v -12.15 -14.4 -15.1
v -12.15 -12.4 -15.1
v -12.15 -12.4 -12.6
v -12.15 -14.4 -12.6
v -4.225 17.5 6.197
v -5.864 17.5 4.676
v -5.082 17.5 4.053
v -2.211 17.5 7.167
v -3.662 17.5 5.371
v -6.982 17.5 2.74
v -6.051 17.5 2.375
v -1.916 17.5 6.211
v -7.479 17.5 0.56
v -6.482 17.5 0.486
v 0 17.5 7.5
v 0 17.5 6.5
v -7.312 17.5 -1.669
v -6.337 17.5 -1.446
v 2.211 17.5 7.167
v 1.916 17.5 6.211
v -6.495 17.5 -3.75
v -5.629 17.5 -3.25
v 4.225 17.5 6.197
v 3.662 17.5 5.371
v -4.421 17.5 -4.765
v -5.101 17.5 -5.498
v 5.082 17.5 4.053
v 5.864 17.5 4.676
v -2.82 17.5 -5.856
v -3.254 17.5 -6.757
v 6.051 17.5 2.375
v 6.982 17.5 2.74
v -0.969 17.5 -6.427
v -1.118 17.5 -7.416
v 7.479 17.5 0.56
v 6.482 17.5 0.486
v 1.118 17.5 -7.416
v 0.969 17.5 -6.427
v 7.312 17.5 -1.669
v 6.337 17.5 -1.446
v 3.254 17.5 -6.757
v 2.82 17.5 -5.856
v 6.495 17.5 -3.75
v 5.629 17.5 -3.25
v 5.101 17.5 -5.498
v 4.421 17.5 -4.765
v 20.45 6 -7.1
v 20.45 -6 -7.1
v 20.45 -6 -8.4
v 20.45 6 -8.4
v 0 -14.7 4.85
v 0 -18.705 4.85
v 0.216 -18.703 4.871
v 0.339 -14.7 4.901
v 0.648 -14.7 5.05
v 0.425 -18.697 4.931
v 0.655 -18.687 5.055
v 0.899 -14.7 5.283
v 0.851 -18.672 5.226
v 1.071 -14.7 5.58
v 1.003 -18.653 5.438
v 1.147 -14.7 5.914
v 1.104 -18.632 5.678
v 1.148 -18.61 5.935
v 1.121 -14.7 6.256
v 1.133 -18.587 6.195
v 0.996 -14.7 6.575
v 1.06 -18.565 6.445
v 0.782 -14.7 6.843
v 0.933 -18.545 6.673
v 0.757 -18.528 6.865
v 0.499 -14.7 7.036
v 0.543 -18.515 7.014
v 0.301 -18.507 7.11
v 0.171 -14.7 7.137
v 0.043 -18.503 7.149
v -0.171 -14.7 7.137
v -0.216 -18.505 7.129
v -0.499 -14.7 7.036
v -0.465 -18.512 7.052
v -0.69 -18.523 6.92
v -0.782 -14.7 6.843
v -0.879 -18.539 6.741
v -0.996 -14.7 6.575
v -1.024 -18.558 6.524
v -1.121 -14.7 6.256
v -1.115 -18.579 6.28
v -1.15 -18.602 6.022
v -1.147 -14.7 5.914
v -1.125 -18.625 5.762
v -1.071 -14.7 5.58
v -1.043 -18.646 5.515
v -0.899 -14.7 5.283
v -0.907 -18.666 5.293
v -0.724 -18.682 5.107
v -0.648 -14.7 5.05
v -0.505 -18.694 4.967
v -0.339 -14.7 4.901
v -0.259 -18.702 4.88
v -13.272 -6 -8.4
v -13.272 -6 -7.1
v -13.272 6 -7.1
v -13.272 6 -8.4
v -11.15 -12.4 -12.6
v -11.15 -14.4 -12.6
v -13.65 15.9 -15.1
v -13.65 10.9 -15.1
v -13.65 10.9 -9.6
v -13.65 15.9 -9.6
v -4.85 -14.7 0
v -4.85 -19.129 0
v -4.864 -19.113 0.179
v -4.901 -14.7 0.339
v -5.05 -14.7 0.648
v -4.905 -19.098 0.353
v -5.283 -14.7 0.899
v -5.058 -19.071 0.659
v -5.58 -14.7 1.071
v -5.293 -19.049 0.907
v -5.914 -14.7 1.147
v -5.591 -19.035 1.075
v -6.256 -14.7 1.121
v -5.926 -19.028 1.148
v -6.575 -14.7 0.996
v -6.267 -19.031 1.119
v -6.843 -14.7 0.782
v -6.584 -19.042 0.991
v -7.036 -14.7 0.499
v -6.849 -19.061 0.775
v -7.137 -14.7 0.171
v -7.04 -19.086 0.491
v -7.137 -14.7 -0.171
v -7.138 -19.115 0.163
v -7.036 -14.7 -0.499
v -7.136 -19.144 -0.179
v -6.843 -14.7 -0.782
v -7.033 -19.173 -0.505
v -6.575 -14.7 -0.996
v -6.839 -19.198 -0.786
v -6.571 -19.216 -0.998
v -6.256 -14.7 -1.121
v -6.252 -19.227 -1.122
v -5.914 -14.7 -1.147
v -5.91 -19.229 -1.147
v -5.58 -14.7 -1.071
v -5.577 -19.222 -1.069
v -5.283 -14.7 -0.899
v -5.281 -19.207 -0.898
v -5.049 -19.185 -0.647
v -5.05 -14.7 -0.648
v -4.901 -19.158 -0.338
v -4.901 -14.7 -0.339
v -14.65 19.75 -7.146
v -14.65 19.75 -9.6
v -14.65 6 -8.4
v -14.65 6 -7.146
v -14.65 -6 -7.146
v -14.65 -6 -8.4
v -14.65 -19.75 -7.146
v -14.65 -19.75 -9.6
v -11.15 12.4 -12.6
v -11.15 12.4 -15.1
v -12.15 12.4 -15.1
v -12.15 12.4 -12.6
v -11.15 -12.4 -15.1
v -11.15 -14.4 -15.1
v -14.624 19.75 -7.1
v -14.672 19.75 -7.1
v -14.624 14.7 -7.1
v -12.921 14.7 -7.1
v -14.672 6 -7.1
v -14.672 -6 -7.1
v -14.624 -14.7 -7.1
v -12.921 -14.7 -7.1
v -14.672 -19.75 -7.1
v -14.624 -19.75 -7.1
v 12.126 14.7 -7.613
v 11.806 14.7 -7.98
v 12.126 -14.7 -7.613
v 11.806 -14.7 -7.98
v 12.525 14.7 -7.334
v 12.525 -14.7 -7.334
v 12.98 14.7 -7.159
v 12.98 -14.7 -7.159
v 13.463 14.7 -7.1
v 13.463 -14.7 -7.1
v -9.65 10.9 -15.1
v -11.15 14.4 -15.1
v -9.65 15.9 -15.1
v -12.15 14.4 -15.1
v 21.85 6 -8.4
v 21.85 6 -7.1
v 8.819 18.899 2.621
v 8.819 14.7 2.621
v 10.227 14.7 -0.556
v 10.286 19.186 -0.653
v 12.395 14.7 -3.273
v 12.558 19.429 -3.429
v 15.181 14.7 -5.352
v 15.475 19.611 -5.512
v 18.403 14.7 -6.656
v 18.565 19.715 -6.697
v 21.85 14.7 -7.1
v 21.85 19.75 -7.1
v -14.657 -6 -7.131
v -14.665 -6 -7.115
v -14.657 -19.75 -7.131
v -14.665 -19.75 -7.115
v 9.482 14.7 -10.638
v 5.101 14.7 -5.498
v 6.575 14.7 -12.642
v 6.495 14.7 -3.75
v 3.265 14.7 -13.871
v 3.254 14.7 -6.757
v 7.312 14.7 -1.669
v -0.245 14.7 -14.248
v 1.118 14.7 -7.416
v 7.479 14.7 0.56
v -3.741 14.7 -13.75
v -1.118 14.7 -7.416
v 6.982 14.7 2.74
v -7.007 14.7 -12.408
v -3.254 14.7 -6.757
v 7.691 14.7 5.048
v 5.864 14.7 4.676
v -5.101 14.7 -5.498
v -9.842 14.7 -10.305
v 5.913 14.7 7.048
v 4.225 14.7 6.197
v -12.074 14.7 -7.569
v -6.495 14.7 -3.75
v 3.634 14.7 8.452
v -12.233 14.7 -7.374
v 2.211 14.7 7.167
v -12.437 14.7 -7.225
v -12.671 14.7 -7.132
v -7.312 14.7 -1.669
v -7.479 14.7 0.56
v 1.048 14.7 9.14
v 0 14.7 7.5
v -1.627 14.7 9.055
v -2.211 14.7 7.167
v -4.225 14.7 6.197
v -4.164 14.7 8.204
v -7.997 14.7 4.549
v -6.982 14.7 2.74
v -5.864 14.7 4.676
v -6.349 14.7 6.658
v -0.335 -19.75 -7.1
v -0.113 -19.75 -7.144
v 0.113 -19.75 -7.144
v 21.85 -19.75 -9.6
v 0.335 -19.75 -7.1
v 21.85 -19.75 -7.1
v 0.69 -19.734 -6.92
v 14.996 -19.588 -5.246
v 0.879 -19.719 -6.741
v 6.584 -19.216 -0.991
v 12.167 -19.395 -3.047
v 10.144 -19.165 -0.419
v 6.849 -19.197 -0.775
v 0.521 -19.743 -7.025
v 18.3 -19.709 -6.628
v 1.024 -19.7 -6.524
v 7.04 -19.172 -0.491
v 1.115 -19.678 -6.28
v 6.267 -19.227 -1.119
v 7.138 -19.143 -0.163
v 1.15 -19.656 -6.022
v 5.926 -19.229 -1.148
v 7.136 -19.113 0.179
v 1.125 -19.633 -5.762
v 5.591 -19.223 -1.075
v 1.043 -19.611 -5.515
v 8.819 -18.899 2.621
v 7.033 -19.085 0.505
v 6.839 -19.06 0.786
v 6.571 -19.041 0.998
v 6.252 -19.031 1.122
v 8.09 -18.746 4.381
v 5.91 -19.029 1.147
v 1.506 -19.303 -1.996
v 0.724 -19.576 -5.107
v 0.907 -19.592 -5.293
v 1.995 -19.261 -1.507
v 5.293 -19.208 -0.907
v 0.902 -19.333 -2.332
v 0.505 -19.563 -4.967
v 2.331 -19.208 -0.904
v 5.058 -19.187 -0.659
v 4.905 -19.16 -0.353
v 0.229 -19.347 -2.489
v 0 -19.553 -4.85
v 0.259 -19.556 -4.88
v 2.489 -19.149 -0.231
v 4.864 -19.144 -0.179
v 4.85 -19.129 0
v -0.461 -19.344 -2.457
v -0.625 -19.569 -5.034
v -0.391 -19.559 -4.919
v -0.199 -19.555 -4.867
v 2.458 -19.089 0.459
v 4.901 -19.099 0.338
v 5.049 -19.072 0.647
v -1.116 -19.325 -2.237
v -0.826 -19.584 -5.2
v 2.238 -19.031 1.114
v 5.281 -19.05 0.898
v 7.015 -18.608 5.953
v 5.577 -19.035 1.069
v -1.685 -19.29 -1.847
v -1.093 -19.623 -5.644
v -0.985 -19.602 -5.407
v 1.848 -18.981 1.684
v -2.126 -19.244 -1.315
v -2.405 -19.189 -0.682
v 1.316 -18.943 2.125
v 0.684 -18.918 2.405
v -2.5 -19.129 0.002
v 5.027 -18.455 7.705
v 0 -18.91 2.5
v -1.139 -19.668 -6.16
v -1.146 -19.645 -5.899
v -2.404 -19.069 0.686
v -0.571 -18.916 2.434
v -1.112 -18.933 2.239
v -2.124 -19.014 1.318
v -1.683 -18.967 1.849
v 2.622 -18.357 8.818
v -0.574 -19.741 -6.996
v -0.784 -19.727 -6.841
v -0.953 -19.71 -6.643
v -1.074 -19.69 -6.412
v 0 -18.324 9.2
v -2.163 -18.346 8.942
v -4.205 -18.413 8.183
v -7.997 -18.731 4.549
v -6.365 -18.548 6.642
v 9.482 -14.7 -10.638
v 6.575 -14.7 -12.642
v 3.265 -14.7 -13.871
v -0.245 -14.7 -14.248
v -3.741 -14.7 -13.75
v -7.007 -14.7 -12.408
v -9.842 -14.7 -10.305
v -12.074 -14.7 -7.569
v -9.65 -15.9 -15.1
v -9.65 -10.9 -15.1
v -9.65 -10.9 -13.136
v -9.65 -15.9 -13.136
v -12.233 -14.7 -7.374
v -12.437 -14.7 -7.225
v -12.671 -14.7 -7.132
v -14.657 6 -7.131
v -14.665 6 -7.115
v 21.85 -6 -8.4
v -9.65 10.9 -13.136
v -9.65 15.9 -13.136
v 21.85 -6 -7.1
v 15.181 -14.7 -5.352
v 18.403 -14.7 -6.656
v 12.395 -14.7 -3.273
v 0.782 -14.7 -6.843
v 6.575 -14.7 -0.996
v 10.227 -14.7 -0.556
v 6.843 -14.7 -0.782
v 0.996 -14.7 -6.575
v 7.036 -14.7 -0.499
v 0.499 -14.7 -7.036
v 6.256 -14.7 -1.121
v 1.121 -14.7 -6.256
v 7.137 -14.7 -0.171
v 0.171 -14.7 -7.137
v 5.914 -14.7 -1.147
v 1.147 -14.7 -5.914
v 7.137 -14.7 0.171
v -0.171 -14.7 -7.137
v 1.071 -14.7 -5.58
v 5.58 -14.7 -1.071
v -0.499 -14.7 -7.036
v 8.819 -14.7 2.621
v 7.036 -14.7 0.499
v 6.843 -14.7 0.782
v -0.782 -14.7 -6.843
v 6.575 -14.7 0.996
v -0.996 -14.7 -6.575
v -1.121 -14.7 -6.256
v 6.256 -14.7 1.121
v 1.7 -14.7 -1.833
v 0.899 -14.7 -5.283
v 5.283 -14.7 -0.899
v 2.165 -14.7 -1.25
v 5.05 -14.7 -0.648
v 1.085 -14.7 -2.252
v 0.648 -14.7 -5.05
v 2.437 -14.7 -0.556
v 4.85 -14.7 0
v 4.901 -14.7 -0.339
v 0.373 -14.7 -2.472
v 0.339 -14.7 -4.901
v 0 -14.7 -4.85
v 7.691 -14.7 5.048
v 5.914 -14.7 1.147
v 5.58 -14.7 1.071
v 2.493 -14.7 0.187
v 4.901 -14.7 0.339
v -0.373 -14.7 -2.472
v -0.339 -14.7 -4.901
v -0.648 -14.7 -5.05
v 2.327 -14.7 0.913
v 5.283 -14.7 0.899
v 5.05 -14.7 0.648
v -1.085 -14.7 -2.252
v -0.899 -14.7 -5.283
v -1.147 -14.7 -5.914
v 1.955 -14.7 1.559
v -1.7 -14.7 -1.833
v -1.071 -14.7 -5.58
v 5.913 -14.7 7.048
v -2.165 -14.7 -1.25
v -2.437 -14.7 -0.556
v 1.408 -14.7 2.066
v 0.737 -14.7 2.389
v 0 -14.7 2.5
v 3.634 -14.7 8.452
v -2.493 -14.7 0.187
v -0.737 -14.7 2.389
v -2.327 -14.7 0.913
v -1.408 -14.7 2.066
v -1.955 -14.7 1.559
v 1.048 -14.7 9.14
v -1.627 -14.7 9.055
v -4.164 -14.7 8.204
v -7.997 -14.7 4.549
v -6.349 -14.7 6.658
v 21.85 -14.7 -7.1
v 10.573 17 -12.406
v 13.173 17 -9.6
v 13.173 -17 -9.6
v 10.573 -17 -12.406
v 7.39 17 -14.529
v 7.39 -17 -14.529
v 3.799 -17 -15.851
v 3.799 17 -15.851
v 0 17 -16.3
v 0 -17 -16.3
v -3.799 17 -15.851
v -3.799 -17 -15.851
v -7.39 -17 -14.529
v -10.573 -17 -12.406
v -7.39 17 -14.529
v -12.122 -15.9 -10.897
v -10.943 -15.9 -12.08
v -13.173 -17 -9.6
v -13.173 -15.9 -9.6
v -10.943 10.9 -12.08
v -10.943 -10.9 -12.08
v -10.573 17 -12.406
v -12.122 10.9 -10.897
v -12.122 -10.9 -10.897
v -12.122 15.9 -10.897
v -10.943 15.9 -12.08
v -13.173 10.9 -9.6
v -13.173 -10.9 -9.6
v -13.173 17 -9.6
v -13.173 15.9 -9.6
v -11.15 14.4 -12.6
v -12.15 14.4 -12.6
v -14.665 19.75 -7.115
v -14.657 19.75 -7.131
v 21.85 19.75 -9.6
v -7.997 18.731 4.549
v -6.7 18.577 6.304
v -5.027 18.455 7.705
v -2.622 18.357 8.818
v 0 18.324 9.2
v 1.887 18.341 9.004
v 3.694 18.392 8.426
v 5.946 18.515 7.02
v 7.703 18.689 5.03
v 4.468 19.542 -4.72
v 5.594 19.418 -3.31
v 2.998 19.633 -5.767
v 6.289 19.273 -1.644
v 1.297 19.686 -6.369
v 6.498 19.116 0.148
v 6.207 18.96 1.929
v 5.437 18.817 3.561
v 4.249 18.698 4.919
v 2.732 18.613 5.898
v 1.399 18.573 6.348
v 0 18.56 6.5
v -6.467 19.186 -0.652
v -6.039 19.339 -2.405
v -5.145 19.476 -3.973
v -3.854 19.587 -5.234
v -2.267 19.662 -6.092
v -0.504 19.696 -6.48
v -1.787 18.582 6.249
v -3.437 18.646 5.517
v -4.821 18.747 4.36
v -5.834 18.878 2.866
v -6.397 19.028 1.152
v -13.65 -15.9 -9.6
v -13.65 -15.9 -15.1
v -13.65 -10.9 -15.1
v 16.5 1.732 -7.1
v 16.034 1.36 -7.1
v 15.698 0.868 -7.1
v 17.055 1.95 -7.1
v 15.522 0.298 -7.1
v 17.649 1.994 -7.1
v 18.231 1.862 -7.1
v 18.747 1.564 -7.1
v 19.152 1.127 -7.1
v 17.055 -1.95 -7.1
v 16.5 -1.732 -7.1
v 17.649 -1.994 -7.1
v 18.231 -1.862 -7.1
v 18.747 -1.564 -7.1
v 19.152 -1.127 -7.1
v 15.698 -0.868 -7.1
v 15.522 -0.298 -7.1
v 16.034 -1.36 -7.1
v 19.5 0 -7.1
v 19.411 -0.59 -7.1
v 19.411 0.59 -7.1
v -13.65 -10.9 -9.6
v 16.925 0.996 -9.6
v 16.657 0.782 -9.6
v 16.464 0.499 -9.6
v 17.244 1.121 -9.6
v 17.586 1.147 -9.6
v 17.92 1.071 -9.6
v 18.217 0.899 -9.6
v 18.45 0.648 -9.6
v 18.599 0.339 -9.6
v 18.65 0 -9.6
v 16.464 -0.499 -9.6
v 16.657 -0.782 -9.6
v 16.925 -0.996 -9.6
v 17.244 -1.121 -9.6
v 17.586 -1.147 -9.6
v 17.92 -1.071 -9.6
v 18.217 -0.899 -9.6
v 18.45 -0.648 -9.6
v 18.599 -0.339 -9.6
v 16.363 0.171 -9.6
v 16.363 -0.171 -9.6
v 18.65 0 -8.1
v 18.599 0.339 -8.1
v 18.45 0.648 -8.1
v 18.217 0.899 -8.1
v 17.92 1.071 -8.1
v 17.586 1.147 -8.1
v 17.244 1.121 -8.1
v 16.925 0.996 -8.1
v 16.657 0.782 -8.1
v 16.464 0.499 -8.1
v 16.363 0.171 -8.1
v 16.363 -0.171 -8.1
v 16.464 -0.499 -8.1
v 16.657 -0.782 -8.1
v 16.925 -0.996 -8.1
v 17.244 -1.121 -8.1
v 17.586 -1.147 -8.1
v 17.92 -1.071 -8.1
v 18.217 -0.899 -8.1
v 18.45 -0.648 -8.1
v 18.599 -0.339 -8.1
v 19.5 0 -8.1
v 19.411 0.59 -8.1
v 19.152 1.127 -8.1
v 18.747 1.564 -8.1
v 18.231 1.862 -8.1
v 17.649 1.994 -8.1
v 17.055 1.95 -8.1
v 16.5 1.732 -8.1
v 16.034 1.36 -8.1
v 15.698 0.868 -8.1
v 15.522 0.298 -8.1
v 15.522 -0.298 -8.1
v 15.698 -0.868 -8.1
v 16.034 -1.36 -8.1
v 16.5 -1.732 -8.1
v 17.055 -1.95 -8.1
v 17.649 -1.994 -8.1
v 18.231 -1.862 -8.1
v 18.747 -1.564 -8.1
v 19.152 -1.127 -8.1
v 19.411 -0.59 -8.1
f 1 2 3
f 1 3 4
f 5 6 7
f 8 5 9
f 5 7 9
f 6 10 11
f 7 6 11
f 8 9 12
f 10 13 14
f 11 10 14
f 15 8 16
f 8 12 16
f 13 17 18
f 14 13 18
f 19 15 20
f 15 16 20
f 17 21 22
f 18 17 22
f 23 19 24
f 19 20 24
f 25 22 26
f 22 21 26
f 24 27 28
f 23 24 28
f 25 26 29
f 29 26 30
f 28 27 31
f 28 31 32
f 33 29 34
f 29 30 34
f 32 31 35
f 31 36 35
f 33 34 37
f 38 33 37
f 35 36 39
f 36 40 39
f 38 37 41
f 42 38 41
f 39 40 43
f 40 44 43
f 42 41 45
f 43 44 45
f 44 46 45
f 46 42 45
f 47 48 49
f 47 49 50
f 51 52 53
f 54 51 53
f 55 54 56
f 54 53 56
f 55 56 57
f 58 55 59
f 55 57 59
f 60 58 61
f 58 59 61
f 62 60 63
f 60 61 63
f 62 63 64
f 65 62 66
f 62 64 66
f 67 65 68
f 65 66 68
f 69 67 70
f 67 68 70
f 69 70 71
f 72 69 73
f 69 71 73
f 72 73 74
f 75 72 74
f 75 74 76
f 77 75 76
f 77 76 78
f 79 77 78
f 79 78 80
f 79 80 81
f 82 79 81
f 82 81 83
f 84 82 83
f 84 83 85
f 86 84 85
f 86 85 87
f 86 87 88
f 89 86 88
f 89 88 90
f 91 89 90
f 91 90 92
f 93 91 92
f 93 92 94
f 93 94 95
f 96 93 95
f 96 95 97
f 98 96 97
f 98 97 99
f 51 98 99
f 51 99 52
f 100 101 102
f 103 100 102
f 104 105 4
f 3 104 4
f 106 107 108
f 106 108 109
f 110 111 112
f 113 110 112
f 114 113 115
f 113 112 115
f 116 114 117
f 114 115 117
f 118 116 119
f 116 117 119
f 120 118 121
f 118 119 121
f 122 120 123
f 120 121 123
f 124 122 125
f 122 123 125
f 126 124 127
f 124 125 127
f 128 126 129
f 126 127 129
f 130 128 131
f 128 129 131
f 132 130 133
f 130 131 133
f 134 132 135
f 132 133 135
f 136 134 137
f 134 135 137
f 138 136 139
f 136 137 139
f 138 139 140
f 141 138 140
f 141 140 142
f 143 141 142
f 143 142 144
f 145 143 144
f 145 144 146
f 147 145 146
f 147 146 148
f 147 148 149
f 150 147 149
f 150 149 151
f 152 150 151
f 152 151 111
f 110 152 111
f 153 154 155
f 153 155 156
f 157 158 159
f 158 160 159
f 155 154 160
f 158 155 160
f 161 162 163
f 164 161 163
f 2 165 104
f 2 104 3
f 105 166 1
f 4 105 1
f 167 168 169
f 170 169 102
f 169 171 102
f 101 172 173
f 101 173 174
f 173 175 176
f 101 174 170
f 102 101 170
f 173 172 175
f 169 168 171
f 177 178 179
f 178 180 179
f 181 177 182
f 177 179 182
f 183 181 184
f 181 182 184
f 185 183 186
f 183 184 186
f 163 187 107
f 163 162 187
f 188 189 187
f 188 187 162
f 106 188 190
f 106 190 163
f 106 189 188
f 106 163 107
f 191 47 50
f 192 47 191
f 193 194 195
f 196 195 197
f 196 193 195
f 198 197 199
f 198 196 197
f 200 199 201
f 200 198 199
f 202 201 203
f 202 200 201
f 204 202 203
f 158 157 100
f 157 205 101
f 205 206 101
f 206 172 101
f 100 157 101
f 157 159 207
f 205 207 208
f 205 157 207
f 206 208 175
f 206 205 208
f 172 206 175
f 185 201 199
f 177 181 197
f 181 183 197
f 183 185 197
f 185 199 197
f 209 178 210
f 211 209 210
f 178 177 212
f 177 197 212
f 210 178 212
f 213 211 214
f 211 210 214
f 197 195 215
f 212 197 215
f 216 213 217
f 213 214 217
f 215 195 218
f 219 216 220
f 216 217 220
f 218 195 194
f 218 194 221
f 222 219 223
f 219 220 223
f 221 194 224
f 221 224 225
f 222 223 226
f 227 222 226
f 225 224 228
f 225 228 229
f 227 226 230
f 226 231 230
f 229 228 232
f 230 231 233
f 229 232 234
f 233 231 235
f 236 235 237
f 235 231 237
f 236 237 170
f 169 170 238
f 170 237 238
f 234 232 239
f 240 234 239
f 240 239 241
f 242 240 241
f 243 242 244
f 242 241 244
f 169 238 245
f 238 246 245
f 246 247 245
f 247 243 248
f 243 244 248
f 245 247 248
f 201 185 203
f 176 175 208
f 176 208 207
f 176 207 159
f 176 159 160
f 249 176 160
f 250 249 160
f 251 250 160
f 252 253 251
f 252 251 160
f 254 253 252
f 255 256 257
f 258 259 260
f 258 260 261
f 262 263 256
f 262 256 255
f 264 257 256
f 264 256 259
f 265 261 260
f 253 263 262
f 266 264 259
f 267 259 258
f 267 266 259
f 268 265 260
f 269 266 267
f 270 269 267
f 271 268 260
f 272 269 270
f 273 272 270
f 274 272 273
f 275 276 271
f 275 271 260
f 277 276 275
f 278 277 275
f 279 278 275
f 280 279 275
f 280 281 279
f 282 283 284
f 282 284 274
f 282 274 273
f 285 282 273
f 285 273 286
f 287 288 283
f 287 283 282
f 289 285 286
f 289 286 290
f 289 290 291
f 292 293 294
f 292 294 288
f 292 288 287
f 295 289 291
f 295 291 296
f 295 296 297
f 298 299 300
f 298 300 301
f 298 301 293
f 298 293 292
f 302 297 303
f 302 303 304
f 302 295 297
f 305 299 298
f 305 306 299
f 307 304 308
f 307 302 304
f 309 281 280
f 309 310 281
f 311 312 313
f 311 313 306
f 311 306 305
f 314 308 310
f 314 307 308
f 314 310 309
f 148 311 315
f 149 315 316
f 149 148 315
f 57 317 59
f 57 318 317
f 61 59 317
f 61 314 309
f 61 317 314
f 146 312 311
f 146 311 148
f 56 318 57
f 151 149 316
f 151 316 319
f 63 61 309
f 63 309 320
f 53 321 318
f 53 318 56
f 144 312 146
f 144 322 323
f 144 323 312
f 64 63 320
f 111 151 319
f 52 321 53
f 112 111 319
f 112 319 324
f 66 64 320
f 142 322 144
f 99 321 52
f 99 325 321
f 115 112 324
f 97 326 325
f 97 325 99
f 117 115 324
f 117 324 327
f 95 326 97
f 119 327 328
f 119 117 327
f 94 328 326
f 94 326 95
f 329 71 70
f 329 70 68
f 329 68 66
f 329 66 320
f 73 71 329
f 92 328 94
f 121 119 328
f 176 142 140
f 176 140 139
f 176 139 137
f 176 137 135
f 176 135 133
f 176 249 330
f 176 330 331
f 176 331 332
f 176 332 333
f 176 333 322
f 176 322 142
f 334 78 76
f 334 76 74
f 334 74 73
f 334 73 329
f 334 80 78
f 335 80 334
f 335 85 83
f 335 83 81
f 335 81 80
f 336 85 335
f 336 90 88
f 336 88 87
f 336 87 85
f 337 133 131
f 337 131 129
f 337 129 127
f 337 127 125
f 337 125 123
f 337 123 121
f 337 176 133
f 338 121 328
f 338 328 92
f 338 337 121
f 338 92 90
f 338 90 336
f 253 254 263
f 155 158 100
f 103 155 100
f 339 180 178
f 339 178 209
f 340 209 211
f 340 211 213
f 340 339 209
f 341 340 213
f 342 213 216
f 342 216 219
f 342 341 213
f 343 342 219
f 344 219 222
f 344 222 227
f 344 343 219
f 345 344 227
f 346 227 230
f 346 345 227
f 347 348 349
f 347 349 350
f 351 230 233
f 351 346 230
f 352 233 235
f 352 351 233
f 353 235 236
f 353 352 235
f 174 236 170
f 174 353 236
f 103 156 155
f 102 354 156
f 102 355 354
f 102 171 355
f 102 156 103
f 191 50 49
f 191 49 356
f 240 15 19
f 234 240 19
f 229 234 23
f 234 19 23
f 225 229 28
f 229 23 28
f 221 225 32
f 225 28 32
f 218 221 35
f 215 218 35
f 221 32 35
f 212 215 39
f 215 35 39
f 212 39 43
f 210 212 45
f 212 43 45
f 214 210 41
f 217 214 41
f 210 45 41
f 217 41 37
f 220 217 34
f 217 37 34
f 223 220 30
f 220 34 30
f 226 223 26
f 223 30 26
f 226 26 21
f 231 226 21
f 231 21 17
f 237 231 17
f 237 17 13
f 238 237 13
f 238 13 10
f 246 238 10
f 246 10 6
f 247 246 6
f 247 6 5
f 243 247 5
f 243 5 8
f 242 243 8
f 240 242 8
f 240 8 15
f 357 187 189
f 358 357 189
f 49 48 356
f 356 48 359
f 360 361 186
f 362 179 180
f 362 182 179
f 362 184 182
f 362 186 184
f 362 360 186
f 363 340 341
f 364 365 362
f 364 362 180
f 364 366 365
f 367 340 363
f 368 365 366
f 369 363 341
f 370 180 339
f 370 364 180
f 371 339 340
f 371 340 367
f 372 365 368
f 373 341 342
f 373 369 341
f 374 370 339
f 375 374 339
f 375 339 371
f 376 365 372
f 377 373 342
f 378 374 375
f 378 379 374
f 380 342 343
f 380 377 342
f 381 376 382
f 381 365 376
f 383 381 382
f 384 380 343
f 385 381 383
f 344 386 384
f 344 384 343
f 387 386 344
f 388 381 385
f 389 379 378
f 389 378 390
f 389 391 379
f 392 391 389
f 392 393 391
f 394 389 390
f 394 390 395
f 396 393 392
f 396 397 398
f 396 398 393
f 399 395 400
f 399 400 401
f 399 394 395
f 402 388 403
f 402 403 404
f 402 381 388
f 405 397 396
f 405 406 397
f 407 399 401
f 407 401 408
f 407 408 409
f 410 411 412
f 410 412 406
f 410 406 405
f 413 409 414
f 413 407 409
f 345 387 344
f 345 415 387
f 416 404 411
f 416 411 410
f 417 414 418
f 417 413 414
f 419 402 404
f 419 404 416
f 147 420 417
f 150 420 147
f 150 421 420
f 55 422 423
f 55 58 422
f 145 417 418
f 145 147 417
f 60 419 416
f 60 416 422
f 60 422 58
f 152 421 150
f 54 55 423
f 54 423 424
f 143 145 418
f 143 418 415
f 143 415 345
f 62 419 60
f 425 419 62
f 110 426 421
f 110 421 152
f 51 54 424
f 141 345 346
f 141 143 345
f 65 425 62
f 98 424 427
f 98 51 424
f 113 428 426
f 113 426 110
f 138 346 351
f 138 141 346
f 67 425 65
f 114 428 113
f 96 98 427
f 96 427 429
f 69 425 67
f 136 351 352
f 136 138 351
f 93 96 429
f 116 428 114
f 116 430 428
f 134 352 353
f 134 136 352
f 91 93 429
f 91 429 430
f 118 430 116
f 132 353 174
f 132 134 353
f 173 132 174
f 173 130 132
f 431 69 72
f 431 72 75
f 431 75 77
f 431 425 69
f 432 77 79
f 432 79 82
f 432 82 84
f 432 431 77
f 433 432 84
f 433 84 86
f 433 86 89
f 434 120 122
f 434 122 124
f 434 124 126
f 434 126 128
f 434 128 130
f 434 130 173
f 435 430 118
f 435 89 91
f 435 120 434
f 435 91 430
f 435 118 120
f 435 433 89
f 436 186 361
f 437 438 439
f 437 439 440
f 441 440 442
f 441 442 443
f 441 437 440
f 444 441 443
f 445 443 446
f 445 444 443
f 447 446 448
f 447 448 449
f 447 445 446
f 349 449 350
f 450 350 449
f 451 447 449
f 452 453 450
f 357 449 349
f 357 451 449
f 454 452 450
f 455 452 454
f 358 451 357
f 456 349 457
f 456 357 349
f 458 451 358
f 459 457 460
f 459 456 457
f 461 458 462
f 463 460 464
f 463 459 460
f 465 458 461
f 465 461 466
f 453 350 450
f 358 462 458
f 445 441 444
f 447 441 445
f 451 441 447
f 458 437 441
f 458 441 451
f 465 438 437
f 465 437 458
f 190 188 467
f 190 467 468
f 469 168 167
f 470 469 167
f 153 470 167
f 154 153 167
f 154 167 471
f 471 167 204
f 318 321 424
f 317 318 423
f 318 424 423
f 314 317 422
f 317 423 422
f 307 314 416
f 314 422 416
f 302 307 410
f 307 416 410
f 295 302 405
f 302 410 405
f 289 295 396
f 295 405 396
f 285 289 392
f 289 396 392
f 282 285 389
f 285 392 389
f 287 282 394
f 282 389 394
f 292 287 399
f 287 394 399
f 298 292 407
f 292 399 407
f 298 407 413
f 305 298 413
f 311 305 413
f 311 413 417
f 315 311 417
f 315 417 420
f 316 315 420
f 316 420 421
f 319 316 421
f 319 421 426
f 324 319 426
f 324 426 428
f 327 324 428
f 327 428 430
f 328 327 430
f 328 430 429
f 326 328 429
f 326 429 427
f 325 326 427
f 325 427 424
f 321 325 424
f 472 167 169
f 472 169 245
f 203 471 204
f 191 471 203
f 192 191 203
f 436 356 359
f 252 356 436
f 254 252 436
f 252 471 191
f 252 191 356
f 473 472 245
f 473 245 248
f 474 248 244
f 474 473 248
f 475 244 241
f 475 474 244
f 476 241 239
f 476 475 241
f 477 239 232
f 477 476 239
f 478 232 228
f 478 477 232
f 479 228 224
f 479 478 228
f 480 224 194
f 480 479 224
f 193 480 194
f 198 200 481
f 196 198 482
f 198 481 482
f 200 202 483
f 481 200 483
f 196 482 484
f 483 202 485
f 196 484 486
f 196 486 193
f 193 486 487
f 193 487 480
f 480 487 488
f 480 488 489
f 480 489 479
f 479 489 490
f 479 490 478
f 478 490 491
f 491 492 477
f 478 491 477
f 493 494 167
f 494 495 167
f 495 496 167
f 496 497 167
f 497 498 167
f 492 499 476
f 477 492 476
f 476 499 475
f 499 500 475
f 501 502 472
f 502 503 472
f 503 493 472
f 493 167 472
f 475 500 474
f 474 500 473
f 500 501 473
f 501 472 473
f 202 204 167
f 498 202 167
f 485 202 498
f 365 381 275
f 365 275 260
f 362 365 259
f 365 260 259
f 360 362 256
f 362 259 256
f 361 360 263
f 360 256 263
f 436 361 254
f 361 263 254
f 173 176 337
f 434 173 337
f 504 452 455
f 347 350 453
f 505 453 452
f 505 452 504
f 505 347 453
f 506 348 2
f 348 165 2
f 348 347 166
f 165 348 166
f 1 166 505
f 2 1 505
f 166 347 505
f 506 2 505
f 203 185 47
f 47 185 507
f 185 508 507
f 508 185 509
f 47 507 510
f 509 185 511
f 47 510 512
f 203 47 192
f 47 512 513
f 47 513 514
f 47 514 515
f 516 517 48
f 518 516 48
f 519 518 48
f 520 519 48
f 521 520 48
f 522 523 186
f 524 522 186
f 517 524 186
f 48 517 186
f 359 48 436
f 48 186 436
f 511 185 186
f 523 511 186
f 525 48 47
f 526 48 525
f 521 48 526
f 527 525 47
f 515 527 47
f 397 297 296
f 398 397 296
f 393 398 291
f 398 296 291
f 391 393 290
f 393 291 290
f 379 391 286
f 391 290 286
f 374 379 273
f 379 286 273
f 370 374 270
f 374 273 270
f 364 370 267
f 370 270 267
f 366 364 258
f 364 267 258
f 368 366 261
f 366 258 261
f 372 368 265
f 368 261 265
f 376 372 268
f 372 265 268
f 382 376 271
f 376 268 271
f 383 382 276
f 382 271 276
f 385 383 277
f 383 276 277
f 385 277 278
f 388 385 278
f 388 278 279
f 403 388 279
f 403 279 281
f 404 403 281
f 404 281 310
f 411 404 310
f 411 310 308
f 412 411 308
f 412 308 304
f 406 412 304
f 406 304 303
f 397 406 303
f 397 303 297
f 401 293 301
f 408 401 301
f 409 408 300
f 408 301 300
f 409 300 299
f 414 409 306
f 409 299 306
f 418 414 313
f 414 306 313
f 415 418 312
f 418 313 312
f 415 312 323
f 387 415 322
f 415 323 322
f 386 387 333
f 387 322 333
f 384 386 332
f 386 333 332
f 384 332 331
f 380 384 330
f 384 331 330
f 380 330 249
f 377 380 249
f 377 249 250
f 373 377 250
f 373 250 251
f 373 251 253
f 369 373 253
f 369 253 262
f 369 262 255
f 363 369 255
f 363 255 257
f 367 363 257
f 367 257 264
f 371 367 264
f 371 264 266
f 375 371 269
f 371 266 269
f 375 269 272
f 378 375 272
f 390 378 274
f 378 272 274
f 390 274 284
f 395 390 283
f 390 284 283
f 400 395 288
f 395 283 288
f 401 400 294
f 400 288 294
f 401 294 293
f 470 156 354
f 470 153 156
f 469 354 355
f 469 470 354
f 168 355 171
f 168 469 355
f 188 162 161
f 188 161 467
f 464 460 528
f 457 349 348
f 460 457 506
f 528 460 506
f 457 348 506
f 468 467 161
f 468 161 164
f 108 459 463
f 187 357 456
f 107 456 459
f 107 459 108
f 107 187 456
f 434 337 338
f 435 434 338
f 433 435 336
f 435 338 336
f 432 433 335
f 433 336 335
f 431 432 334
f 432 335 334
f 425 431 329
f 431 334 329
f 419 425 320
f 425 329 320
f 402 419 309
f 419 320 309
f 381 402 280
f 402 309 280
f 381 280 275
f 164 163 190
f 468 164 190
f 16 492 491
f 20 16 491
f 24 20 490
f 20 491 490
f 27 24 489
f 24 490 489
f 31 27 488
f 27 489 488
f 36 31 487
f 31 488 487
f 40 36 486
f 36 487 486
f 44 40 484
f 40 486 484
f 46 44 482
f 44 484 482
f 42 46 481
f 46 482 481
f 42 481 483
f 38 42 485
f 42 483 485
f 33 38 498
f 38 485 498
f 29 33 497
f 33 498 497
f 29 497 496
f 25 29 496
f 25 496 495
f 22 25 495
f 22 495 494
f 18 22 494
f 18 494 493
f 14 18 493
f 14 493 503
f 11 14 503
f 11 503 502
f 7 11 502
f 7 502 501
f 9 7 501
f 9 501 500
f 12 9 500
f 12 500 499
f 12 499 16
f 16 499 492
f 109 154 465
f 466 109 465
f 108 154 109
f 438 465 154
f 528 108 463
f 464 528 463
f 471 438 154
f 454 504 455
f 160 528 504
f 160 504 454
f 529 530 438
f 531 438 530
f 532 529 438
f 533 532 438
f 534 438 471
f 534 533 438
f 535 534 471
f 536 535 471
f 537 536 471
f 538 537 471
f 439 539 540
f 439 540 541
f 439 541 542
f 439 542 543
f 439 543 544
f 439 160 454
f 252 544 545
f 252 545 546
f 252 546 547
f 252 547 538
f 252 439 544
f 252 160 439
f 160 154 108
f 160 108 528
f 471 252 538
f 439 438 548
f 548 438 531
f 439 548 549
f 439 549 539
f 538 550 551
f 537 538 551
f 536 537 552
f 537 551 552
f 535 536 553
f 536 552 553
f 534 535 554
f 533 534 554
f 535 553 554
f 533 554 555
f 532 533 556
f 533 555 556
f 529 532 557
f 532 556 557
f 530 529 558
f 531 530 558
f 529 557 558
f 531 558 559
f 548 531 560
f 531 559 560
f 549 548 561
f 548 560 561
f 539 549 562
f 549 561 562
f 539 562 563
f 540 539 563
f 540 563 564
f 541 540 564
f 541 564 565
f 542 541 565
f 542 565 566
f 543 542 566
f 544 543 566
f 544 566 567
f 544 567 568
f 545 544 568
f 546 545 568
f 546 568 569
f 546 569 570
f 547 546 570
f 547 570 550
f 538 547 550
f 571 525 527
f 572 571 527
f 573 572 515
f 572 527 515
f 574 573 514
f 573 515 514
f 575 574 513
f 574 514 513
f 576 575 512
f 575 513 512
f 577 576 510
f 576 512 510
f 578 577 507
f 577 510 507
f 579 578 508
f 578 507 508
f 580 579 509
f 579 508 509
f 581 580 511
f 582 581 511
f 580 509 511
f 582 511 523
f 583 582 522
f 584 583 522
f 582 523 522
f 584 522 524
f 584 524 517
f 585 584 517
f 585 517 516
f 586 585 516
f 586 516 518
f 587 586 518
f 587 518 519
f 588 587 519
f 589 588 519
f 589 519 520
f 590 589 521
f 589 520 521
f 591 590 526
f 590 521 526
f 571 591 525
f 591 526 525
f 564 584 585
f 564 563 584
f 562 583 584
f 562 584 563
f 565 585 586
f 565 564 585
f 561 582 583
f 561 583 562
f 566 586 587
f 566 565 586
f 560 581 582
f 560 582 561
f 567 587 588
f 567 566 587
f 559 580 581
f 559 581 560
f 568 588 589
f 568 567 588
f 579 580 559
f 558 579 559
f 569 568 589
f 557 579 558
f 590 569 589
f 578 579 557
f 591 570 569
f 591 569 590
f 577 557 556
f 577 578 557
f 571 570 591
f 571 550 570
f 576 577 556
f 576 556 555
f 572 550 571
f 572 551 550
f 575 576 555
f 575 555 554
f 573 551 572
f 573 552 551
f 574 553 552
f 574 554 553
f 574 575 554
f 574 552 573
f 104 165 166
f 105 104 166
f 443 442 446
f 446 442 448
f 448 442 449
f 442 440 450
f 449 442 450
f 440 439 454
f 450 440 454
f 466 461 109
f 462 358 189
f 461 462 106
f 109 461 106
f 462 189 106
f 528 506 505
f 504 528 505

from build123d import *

# Parameters (mm, degrees)
SKETCH_1_R               = 16.3
EXTRUDE_1_DEPTH          = 19.75
SKETCH_2_W               = 36.5
SKETCH_2_H               = 2.5
EXTRUDE_2_DEPTH          = 39.5
SKETCH_3_W               = 44.844436064
SKETCH_3_H               = 25.506740045
CUT_EXTRUDE_1_DEPTH      = 50
EXTRUDE_3_DEPTH          = 5.05
SKETCH_5_R               = 14.25
CUT_EXTRUDE_2_DEPTH      = 29.4
SKETCH_6_R               = 2.5
CUT_EXTRUDE_3_DEPTH      = 44.930797853
CUT_EXTRUDE_6_REACH      = 49.993
SKETCH_9_R               = 7.5
SKETCH_12_R              = 1.15
CUT_EXTRUDE_9_DEPTH      = 34.662664779
SKETCH_13_R              = 2
CUT_EXTRUDE_10_DEPTH     = 1
SKETCH_14_W              = 2.8
SKETCH_14_H              = 12
CUT_EXTRUDE_11_DEPTH     = 1.3
SKETCH_15_W              = 2.8
SKETCH_15_H              = 12
CUT_EXTRUDE_12_DEPTH     = 1.3
EXTRUDE_5_REACH          = 40.183
EXTRUDE_5_END_RADIUS     = 16.3
SKETCH_16_W              = 4
SKETCH_16_H              = 5
SKETCH_17_W              = 1
SKETCH_17_H              = 2
CUT_EXTRUDE_13_DEPTH     = 2.5
SKETCH_19_R              = 8.51898124
SKETCH_19_R_2            = 6.5
EXTRUDE_6_DEPTH          = 2.25
CUT_EXTRUDE_18_REACH     = 49.993
SKETCH_20_R              = 1.15
PATTERN_CIRCULAR_1_COUNT = 4
CUT_EXTRUDE_8_DEPTH      = 45.587021654
SKETCH_18_W              = 26.346157216
SKETCH_18_H              = 2.75
CUT_EXTRUDE_16_DEPTH     = 12.5
FILLET_1_R               = 2
FILLET_2_R               = 1


with BuildPart() as part:
    # 草图1 → 凸台-拉伸1 (new, symmetric)
    with BuildSketch(Plane(origin=(0, 0, 0), x_dir=(1, 0, 0), z_dir=(0, 1, 0))):
        with Locations(Location((0, 0, 0), (0, 0, 270))):
            Circle(SKETCH_1_R)
    extrude(amount=EXTRUDE_1_DEPTH, both=True)

    # 草图2 → 凸台-拉伸2 (add, through all)
    with BuildSketch(Plane.XZ.offset(19.75)):
        with Locations((3.6, -8.35)):
            Rectangle(SKETCH_2_W, SKETCH_2_H)
    extrude(amount=-EXTRUDE_2_DEPTH)

    # 草图3 → 切除-拉伸1 (cut)
    with BuildSketch(Plane.XZ.offset(19.75)):
        with Locations((-0.572218032, 5.653370022)):
            Rectangle(SKETCH_3_W, SKETCH_3_H)
    extrude(amount=-CUT_EXTRUDE_1_DEPTH, mode=Mode.SUBTRACT)

    # 草图4 → 凸台-拉伸3 (add)
    with BuildSketch(Plane.XZ.offset(19.75)):
        with BuildLine():
            Line((-14.65, -7.146152811), (-7.996542478, 4.549209646))
            ThreePointArc((-7.996542478, 4.549209646), (1.047927533, 9.140122969), (8.818653972, 2.621324497))
            ThreePointArc((8.818653972, 2.621324497), (13.721037439, -4.401937543), (21.85, -7.1))
            Line((21.85, -7.1), (-14.65, -7.146152811))
        make_face()
    extrude_3 = extrude(amount=-EXTRUDE_3_DEPTH)

    # 镜向1: 凸台-拉伸3 across plane
    add(extrude_3.mirror(Plane.ZX))

    # 草图5 → 切除-拉伸2 (cut)
    with BuildSketch(Plane(origin=(0, -14.7, 0), x_dir=(1, 0, 0), z_dir=(0, 1, 0))):
        Circle(SKETCH_5_R)
    extrude(amount=CUT_EXTRUDE_2_DEPTH, mode=Mode.SUBTRACT)

    # 草图6 → 切除-拉伸3 (cut, through all)
    with BuildSketch(Plane(origin=(0, -14.7, 0), x_dir=(1, 0, 0), z_dir=(0, 1, 0))):
        with Locations(Location((0, 0, 0), (0, 0, 270))):
            Circle(SKETCH_6_R)
    extrude(amount=-CUT_EXTRUDE_3_DEPTH, mode=Mode.SUBTRACT)

    # 草图9 → 切除-拉伸6 (cut, up to next)
    with BuildSketch(Plane(origin=(0, 19.75, 0), x_dir=(1, 0, 0), z_dir=(0, 1, 0)), mode=Mode.PRIVATE) as cut_extrude_6_sk1:
        with Locations(Location((0, 0, 0), (0, 0, 270))):
            Circle(SKETCH_9_R)
    cut_extrude_6_tool1 = extrude(cut_extrude_6_sk1.sketch, amount=-CUT_EXTRUDE_6_REACH, mode=Mode.PRIVATE) & part.part
    add(cut_extrude_6_tool1.solids().sort_by_distance((0, 19.75, 0))[0], mode=Mode.SUBTRACT)

    # 草图12 → 切除-拉伸9 (cut, through all)
    with BuildSketch(Plane.XY.offset(-7.1)):
        with Locations((17.5, 0)):
            Circle(SKETCH_12_R)
    extrude(amount=-CUT_EXTRUDE_9_DEPTH, mode=Mode.SUBTRACT)

    # 草图13 → 切除-拉伸10 (cut)
    with BuildSketch(Plane.XY.offset(-7.1)):
        with Locations((17.5, 0)):
            Circle(SKETCH_13_R)
    extrude(amount=-CUT_EXTRUDE_10_DEPTH, mode=Mode.SUBTRACT)

    # 草图14 → 切除-拉伸11 (cut)
    with BuildSketch(Plane.XY.offset(-7.1)):
        with Locations((21.85, 0)):
            Rectangle(SKETCH_14_W, SKETCH_14_H)
    extrude(amount=-CUT_EXTRUDE_11_DEPTH, mode=Mode.SUBTRACT)

    # 草图15 → 切除-拉伸12 (cut)
    with BuildSketch(Plane.XY.offset(-7.1)):
        with Locations((-14.672423113, 0)):
            Rectangle(SKETCH_15_W, SKETCH_15_H)
    extrude(amount=-CUT_EXTRUDE_12_DEPTH, mode=Mode.SUBTRACT)

    # 凸台-拉伸5: up to this cylinder (the profile starts outside it)
    extrude_5_end = Plane(origin=(0, 13.4, 0), z_dir=(0, -1, 0)) * Cylinder(EXTRUDE_5_END_RADIUS, 113.966, mode=Mode.PRIVATE)
    # 草图16 → 凸台-拉伸5 (add, up to the surface)
    with BuildSketch(Plane(origin=(0, 0, -15.1), x_dir=(-1, 0, 0), z_dir=(0, 0, -1)), mode=Mode.PRIVATE) as extrude_5_sk1:
        with Locations((11.65, 13.4)):
            Rectangle(SKETCH_16_W, SKETCH_16_H)
    extrude_5_tool1 = extrude(extrude_5_sk1.sketch, amount=-EXTRUDE_5_REACH, mode=Mode.PRIVATE) - extrude_5_end
    extrude_5 = extrude_5_tool1.solids().sort_by_distance((-11.65, 13.4, -15.1))[0]
    add(extrude_5)

    # 镜向4: 凸台-拉伸5 across plane
    add(extrude_5.mirror(Plane.ZX))

    # 草图17 → 切除-拉伸13 (cut)
    with BuildSketch(Plane(origin=(0, 0, -15.1), x_dir=(-1, 0, 0), z_dir=(0, 0, -1))):
        with Locations((11.65, 13.4)):
            Rectangle(SKETCH_17_W, SKETCH_17_H)
    cut_extrude_13 = extrude(amount=-CUT_EXTRUDE_13_DEPTH, mode=Mode.SUBTRACT)

    # 镜向5: 切除-拉伸13 across plane
    add(cut_extrude_13.mirror(Plane.ZX), mode=Mode.SUBTRACT)

    # 草图19 → 凸台-拉伸6 (add)
    with BuildSketch(Plane(origin=(0, 19.75, 0), x_dir=(1, 0, 0), z_dir=(0, 1, 0))):
        Circle(SKETCH_19_R)
        with Locations(Location((0, 0, 0), (0, 0, 270))):
            Circle(SKETCH_19_R_2, mode=Mode.SUBTRACT)
    extrude(amount=-EXTRUDE_6_DEPTH)

    # 草图20 → 切除-拉伸18 (cut, up to next)
    with BuildSketch(Plane.XZ.offset(19.75), mode=Mode.PRIVATE) as cut_extrude_18_sk1:
        with Locations(Location((0, 6, 0), (0, 0, 270))):
            Circle(SKETCH_20_R)
    cut_extrude_18_tool1 = extrude(cut_extrude_18_sk1.sketch, amount=-CUT_EXTRUDE_18_REACH, mode=Mode.PRIVATE) & part.part
    cut_extrude_18 = cut_extrude_18_tool1.solids().sort_by_distance((0, -19.75, 6))[0]
    add(cut_extrude_18, mode=Mode.SUBTRACT)

    # 阵列(圆周)1: 切除-拉伸18 ×4 about axis
    pattern_circular_1_axis = Axis((0, 0, 0), (0, 1, 0))
    for i in range(1, PATTERN_CIRCULAR_1_COUNT):
        add(cut_extrude_18.rotate(pattern_circular_1_axis, i * 360 / PATTERN_CIRCULAR_1_COUNT), mode=Mode.SUBTRACT)

    # 草图7 → 切除-拉伸8 (cut, through all)
    with BuildSketch(Plane.ZY.offset(14.65)):
        Polygon((-7.1, 19.75), (9.2, 18.323934785), (9.2, 19.75), align=None)
    cut_extrude_8 = extrude(amount=-CUT_EXTRUDE_8_DEPTH, mode=Mode.SUBTRACT)

    # 镜向3: 切除-拉伸8 across plane
    add(cut_extrude_8.mirror(Plane.ZX), mode=Mode.SUBTRACT)

    # 草图18 → 切除-拉伸16 (cut)
    with BuildSketch(Plane(origin=(0, 0, -9.6), x_dir=(-1, 0, 0), z_dir=(0, 0, -1))):
        with Locations((0, 18.375)):
            Rectangle(SKETCH_18_W, SKETCH_18_H)
    cut_extrude_16 = extrude(amount=CUT_EXTRUDE_16_DEPTH, mode=Mode.SUBTRACT)

    # 镜向6: 切除-拉伸16 across plane
    add(cut_extrude_16.mirror(Plane.ZX), mode=Mode.SUBTRACT)

    # 圆角1
    fillet_1_edges = [part.edges().sort_by_distance(p)[0] for p in [
        (12.355262037, 0, -7.1),
    ]]
    fillet(fillet_1_edges, radius=FILLET_1_R)

    # 圆角2
    fillet_2_edges = [part.edges().sort_by_distance(p)[0] for p in [
        (-12.355262037, 0, -7.1),
    ]]
    fillet(fillet_2_edges, radius=FILLET_2_R)


solid = part.part
